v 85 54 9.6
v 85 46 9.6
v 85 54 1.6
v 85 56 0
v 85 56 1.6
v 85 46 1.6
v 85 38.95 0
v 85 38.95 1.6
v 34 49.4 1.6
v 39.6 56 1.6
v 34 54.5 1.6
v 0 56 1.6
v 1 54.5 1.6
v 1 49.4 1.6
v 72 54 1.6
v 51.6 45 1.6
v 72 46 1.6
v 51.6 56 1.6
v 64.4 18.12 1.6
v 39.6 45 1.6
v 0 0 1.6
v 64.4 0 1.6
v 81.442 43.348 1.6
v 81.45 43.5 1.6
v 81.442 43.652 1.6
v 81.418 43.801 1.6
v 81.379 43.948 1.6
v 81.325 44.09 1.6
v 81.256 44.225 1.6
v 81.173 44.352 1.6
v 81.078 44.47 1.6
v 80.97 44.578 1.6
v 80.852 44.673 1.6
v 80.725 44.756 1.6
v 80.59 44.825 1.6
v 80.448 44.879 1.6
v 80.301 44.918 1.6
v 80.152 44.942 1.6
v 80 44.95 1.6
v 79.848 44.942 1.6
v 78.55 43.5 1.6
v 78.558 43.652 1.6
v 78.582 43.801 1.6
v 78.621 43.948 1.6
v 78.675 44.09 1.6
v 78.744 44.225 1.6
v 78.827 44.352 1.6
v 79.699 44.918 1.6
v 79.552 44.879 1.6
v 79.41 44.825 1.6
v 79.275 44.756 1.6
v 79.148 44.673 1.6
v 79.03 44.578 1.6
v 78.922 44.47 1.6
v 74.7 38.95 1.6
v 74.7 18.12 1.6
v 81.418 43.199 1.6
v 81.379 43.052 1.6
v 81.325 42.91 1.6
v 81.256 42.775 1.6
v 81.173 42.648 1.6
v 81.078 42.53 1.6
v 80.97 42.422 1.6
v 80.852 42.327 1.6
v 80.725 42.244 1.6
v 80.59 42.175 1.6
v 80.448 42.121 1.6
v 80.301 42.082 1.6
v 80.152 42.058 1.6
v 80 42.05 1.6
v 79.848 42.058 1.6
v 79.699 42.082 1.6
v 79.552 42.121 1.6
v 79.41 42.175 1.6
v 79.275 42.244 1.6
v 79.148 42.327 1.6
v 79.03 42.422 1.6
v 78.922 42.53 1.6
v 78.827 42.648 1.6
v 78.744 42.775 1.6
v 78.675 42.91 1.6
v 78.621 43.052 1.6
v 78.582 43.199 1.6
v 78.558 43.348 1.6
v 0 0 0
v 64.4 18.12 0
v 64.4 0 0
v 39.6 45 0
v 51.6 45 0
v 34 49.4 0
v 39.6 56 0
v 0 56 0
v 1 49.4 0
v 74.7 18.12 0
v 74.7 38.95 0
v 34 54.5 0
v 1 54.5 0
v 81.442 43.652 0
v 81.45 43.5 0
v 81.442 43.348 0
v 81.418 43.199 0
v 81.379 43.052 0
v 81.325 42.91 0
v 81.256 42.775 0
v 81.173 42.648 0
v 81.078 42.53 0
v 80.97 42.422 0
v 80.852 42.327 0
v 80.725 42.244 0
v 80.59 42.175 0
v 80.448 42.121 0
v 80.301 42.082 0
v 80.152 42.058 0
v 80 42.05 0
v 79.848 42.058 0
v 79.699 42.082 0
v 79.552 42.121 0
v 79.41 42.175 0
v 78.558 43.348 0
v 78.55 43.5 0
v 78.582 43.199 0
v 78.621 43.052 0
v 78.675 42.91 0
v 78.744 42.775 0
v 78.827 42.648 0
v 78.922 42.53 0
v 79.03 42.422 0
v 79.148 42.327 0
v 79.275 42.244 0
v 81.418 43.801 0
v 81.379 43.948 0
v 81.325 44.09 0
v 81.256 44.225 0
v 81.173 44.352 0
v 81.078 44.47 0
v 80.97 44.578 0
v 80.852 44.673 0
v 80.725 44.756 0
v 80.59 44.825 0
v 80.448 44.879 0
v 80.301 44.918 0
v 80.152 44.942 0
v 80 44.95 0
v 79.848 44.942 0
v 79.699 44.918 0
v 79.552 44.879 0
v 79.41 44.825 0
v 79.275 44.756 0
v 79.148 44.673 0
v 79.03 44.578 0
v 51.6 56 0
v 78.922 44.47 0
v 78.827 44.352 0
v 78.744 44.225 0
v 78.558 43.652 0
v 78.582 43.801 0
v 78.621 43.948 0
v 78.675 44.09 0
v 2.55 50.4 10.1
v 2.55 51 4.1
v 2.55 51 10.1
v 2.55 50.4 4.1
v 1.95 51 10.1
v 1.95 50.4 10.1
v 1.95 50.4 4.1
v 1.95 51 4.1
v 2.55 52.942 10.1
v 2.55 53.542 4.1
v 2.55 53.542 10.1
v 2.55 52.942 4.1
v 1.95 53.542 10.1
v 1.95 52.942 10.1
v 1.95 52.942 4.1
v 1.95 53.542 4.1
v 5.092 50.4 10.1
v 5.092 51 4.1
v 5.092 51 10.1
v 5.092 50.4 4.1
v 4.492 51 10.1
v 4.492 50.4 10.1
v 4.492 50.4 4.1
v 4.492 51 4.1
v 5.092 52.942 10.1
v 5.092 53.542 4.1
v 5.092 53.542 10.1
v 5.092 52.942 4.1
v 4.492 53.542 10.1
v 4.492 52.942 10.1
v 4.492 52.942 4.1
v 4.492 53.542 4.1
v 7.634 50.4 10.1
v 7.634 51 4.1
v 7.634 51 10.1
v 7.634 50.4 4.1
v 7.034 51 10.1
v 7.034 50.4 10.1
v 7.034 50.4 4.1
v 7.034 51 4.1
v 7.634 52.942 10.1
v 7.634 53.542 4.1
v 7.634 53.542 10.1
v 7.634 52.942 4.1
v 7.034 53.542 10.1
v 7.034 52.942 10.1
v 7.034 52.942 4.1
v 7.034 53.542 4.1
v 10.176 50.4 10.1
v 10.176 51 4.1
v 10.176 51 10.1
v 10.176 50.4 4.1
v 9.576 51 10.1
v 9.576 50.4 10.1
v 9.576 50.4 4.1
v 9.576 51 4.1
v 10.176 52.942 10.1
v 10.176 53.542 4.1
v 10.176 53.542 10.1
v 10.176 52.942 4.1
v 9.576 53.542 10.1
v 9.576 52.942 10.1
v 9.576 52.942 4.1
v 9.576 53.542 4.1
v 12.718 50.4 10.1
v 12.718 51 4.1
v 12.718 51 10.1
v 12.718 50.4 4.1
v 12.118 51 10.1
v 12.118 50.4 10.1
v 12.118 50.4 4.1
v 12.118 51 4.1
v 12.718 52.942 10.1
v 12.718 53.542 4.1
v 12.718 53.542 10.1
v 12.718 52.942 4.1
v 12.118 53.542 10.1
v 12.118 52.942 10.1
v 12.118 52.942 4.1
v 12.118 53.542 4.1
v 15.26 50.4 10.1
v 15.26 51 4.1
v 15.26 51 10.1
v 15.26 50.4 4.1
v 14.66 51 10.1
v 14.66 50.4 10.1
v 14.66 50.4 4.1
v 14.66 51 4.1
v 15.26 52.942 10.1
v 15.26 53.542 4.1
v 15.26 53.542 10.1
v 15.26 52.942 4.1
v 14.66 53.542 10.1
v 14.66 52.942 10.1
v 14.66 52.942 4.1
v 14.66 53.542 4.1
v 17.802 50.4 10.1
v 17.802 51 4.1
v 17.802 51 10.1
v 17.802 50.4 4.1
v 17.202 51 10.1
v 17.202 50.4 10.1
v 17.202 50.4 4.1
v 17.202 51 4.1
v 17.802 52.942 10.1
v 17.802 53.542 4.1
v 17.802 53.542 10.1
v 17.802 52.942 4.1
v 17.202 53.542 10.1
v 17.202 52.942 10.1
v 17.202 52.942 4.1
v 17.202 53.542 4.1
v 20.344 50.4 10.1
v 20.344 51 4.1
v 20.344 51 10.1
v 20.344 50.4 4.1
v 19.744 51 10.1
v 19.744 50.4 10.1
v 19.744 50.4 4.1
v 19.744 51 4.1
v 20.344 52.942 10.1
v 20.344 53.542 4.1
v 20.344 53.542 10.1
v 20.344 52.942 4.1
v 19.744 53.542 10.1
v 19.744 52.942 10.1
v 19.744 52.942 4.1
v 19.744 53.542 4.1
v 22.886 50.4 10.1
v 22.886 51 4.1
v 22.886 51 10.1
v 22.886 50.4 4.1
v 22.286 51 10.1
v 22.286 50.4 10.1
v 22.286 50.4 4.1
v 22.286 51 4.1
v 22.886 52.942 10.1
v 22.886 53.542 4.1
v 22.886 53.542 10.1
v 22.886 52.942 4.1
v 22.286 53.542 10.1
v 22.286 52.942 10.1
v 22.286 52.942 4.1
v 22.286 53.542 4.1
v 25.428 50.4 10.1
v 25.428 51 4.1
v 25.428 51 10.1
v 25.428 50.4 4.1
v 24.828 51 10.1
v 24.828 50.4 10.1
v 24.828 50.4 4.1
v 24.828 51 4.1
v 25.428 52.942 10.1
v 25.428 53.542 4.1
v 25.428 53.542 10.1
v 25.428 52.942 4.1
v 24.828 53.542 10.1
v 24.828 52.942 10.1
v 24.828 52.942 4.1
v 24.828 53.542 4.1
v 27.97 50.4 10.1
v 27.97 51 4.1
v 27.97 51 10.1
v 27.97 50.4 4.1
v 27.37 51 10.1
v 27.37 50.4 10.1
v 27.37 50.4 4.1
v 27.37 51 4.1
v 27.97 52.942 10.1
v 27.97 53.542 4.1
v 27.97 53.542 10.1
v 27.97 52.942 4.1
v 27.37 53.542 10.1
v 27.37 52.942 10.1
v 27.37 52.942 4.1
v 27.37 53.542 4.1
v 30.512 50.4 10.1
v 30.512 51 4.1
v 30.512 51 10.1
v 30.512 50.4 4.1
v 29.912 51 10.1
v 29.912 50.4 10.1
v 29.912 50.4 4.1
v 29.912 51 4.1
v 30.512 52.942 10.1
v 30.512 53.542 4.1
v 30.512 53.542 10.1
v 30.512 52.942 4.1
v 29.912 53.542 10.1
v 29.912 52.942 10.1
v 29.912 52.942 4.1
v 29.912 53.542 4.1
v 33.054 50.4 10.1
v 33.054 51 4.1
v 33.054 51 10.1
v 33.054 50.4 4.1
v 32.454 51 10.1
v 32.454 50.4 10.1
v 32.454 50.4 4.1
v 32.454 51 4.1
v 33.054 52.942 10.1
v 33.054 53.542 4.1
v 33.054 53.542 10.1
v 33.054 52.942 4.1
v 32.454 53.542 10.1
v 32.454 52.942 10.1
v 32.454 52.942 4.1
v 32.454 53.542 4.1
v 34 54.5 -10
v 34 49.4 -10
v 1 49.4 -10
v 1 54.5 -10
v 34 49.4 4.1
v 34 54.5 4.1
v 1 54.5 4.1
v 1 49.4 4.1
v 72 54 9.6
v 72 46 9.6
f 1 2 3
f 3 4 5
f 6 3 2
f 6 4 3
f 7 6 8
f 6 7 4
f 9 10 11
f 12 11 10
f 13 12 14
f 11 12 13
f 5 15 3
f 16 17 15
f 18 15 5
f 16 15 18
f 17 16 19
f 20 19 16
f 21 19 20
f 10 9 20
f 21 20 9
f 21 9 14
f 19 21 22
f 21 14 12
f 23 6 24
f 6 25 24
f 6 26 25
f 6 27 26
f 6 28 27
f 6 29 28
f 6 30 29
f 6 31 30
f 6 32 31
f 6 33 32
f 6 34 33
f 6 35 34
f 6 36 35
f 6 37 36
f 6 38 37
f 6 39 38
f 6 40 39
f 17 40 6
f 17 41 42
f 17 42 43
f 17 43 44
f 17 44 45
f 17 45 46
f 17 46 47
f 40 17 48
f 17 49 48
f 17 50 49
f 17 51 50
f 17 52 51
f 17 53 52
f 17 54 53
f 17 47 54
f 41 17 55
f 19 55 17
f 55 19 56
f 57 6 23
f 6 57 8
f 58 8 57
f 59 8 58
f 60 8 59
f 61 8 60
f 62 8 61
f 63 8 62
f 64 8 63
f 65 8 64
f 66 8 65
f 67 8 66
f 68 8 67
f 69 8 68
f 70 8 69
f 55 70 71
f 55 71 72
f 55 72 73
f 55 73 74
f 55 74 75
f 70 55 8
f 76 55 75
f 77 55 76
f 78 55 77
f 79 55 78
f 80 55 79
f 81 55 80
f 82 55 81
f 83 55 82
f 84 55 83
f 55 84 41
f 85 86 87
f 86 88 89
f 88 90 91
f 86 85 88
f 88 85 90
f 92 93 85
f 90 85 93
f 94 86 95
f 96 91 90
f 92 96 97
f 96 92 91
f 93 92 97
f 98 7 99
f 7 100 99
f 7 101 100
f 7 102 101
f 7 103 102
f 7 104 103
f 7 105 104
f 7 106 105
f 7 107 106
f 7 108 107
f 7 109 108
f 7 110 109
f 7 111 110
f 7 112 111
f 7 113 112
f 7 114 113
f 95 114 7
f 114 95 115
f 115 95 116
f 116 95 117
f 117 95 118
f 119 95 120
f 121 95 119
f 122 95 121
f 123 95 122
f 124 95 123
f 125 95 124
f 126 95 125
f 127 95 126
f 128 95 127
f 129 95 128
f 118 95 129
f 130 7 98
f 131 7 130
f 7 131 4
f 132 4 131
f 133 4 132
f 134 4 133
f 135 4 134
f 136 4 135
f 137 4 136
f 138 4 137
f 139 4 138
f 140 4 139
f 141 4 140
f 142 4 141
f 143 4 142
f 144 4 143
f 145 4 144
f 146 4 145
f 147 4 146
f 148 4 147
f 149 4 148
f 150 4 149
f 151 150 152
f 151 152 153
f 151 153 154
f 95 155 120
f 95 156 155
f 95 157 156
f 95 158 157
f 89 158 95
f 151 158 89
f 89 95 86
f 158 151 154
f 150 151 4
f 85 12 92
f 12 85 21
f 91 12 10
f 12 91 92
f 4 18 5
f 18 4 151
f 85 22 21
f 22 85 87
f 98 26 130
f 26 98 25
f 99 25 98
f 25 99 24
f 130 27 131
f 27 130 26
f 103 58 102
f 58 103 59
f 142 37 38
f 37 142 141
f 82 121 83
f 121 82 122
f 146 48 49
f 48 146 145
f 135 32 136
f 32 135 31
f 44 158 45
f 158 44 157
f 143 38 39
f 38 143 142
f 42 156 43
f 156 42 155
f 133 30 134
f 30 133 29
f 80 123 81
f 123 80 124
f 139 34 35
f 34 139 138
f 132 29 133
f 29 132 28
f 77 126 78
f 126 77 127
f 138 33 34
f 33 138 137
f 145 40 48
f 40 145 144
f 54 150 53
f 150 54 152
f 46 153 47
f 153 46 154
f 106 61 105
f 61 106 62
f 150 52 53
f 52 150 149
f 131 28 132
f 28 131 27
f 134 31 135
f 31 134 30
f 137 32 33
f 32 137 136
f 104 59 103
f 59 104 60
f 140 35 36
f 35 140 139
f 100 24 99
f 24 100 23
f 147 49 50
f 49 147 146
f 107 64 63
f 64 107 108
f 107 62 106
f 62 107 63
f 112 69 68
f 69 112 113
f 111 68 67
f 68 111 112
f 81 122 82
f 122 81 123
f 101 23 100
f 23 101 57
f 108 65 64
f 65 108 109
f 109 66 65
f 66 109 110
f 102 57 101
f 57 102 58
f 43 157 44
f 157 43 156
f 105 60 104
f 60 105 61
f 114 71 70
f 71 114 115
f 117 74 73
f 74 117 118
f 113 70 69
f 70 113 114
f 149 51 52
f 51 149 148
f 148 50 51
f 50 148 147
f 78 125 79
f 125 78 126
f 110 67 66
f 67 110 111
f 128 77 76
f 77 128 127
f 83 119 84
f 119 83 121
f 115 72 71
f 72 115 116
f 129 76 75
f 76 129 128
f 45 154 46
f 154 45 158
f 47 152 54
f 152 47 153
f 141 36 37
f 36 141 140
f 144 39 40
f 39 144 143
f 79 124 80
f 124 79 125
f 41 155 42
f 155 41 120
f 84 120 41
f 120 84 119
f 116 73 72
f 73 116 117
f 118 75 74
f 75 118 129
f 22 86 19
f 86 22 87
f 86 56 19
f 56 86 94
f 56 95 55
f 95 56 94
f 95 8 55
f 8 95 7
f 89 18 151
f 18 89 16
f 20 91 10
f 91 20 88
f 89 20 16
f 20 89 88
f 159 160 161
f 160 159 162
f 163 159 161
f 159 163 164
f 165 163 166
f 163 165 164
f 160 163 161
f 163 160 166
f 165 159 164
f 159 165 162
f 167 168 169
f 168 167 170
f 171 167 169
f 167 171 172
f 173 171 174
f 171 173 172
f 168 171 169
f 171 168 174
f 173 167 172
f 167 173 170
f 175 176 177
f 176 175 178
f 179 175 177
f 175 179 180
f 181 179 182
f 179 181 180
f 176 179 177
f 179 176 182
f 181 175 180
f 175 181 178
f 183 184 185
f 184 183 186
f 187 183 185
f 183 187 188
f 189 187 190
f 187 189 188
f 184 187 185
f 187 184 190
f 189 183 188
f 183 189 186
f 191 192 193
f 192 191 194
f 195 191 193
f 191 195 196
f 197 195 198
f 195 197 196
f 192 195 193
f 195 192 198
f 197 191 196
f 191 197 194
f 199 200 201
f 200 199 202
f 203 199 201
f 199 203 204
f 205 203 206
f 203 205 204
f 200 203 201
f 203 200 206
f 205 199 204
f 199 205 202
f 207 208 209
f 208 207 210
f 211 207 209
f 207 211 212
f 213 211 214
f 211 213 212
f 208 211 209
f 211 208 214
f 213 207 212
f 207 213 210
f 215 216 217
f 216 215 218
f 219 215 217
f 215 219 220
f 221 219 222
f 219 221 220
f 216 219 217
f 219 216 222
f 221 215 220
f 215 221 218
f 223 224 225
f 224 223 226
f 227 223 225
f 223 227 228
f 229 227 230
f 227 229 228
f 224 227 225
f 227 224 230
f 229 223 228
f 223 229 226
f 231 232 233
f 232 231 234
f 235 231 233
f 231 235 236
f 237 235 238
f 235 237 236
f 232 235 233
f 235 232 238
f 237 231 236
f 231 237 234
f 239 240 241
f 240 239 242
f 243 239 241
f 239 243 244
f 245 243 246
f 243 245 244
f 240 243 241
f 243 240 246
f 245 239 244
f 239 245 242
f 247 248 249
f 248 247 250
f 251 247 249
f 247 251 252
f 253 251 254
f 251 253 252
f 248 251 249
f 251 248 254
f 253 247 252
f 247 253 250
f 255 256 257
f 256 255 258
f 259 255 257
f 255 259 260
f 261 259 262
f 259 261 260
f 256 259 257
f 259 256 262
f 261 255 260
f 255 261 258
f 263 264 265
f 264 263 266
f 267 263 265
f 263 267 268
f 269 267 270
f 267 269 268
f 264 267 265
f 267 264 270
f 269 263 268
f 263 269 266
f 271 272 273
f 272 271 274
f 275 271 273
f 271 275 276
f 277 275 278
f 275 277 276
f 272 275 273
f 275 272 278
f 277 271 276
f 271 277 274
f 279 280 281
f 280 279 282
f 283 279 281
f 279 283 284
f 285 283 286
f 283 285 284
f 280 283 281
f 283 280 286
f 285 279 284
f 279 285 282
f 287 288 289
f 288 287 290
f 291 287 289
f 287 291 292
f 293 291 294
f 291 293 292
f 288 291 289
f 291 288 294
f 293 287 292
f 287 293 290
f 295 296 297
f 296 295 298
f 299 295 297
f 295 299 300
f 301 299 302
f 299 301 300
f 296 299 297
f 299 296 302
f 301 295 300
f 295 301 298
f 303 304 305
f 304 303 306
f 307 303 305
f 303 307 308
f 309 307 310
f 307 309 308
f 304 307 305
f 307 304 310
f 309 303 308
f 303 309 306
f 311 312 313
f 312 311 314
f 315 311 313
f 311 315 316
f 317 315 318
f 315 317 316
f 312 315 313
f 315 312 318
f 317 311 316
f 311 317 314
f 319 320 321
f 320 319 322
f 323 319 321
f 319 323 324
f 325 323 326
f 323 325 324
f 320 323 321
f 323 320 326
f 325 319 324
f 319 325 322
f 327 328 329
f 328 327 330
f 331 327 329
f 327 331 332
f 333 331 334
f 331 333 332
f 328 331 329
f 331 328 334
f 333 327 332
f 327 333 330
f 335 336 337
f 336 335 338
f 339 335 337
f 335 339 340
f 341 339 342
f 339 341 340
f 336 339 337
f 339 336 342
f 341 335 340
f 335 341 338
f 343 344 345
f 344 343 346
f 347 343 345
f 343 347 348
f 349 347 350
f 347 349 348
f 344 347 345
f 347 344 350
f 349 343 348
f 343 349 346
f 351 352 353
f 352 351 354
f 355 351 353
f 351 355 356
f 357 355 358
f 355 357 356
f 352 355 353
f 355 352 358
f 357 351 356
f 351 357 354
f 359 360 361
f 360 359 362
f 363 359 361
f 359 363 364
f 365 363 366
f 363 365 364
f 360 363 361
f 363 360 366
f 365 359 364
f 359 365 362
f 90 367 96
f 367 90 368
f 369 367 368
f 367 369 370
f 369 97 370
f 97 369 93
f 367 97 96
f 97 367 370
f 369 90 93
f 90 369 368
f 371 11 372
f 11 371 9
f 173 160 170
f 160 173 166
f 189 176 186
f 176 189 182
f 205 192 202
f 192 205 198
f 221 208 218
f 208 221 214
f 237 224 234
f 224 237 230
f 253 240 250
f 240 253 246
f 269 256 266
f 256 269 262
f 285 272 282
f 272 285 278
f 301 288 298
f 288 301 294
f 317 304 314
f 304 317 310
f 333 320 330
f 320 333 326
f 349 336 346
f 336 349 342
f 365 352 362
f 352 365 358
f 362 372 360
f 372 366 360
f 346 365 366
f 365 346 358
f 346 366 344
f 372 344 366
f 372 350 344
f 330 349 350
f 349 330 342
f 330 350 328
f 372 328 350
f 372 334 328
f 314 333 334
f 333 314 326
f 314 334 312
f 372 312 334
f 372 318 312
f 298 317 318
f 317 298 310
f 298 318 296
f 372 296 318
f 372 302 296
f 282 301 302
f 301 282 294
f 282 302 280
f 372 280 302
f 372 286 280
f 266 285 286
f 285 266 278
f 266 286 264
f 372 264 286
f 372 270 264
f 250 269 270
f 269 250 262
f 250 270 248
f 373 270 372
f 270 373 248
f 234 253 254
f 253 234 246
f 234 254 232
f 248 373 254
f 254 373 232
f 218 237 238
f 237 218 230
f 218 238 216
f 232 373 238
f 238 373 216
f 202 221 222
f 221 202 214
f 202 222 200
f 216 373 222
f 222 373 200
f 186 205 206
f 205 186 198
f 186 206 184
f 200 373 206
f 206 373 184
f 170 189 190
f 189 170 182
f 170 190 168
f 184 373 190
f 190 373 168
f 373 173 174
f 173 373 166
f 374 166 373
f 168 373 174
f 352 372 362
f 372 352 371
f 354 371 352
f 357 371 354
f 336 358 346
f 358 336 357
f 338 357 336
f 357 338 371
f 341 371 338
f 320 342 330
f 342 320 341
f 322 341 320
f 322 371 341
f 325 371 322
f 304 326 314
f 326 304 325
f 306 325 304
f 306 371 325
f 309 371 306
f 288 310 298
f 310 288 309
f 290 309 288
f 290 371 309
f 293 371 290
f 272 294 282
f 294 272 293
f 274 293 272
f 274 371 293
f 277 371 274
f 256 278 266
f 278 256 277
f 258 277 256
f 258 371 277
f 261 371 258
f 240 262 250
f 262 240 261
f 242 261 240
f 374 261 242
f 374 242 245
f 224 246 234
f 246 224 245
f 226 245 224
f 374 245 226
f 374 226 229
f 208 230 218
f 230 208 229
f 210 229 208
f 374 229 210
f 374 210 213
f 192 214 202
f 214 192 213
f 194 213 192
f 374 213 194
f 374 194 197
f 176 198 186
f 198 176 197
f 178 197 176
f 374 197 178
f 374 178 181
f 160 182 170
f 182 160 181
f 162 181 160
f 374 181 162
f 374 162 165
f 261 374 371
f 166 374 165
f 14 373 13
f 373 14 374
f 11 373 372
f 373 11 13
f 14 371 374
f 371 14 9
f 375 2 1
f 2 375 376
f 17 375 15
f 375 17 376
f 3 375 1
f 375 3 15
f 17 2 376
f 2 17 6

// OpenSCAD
/*
 * Humble Pi
 *
 * Copyright 2012 b@Zi.iS
 *
 * License CC BY 3.0
 */
$fn=60;

humble_pi();

module humble_pi() {

	// PCB
	color([0,.75,0]) {
		difference() {
			cube([
				85,
				56,
				1.6
			]);
			// Mounting hole
			translate([
				85 - 5,
				56 - 12.5,
				-1
			]) {
				cylinder(
					r = 2.9/2,
					h = 4
				);
			}

			// Ethernet
			translate([
				64.4,
				-1,
				-1
			]) {
				cube([
					100,
					19.12,
					3
				]);
			}

			// USB
			translate([
				74.7,
				-1,
				-1
			]) {
				cube([
					100,
					1+23.35+14.6+1,
					3
				]);
			}

			// Video
			translate([
				39.6,
				45,
				-1
			]) {
				cube([
					12,
					12,
					3
				]);
			}
		}
	}

	// Header
	color([0,0,0]) {
		translate([
			1,
			49.4,
			-10
		]) {
			cube([
				33,
				5.1,
				10
			]);
		}
	}


	// Header
	color([0,0,0]) {
		translate([
			1,
			49.4,
			1.6
		]) {
			cube([
				33,
				5.1,
				2.5
			]);
		}
	}
	// Pins
	color([1,1,0]) {
		for (x=[0:12]) {
			for (y=[0:1]) {
				translate([
					1.95 + x*2.542,
					50.4 + y*2.542,
					1.6
				]) {
					cube([
						.6,
						.6,
						8.5
					]);
				}
			}
		}
	}

	// Power
	color([0,0,0]) {
		translate([
			72,
			46,
			1.6
		]) {
			cube([
				13,
				8,
				8
			]);
		}
	}
}
